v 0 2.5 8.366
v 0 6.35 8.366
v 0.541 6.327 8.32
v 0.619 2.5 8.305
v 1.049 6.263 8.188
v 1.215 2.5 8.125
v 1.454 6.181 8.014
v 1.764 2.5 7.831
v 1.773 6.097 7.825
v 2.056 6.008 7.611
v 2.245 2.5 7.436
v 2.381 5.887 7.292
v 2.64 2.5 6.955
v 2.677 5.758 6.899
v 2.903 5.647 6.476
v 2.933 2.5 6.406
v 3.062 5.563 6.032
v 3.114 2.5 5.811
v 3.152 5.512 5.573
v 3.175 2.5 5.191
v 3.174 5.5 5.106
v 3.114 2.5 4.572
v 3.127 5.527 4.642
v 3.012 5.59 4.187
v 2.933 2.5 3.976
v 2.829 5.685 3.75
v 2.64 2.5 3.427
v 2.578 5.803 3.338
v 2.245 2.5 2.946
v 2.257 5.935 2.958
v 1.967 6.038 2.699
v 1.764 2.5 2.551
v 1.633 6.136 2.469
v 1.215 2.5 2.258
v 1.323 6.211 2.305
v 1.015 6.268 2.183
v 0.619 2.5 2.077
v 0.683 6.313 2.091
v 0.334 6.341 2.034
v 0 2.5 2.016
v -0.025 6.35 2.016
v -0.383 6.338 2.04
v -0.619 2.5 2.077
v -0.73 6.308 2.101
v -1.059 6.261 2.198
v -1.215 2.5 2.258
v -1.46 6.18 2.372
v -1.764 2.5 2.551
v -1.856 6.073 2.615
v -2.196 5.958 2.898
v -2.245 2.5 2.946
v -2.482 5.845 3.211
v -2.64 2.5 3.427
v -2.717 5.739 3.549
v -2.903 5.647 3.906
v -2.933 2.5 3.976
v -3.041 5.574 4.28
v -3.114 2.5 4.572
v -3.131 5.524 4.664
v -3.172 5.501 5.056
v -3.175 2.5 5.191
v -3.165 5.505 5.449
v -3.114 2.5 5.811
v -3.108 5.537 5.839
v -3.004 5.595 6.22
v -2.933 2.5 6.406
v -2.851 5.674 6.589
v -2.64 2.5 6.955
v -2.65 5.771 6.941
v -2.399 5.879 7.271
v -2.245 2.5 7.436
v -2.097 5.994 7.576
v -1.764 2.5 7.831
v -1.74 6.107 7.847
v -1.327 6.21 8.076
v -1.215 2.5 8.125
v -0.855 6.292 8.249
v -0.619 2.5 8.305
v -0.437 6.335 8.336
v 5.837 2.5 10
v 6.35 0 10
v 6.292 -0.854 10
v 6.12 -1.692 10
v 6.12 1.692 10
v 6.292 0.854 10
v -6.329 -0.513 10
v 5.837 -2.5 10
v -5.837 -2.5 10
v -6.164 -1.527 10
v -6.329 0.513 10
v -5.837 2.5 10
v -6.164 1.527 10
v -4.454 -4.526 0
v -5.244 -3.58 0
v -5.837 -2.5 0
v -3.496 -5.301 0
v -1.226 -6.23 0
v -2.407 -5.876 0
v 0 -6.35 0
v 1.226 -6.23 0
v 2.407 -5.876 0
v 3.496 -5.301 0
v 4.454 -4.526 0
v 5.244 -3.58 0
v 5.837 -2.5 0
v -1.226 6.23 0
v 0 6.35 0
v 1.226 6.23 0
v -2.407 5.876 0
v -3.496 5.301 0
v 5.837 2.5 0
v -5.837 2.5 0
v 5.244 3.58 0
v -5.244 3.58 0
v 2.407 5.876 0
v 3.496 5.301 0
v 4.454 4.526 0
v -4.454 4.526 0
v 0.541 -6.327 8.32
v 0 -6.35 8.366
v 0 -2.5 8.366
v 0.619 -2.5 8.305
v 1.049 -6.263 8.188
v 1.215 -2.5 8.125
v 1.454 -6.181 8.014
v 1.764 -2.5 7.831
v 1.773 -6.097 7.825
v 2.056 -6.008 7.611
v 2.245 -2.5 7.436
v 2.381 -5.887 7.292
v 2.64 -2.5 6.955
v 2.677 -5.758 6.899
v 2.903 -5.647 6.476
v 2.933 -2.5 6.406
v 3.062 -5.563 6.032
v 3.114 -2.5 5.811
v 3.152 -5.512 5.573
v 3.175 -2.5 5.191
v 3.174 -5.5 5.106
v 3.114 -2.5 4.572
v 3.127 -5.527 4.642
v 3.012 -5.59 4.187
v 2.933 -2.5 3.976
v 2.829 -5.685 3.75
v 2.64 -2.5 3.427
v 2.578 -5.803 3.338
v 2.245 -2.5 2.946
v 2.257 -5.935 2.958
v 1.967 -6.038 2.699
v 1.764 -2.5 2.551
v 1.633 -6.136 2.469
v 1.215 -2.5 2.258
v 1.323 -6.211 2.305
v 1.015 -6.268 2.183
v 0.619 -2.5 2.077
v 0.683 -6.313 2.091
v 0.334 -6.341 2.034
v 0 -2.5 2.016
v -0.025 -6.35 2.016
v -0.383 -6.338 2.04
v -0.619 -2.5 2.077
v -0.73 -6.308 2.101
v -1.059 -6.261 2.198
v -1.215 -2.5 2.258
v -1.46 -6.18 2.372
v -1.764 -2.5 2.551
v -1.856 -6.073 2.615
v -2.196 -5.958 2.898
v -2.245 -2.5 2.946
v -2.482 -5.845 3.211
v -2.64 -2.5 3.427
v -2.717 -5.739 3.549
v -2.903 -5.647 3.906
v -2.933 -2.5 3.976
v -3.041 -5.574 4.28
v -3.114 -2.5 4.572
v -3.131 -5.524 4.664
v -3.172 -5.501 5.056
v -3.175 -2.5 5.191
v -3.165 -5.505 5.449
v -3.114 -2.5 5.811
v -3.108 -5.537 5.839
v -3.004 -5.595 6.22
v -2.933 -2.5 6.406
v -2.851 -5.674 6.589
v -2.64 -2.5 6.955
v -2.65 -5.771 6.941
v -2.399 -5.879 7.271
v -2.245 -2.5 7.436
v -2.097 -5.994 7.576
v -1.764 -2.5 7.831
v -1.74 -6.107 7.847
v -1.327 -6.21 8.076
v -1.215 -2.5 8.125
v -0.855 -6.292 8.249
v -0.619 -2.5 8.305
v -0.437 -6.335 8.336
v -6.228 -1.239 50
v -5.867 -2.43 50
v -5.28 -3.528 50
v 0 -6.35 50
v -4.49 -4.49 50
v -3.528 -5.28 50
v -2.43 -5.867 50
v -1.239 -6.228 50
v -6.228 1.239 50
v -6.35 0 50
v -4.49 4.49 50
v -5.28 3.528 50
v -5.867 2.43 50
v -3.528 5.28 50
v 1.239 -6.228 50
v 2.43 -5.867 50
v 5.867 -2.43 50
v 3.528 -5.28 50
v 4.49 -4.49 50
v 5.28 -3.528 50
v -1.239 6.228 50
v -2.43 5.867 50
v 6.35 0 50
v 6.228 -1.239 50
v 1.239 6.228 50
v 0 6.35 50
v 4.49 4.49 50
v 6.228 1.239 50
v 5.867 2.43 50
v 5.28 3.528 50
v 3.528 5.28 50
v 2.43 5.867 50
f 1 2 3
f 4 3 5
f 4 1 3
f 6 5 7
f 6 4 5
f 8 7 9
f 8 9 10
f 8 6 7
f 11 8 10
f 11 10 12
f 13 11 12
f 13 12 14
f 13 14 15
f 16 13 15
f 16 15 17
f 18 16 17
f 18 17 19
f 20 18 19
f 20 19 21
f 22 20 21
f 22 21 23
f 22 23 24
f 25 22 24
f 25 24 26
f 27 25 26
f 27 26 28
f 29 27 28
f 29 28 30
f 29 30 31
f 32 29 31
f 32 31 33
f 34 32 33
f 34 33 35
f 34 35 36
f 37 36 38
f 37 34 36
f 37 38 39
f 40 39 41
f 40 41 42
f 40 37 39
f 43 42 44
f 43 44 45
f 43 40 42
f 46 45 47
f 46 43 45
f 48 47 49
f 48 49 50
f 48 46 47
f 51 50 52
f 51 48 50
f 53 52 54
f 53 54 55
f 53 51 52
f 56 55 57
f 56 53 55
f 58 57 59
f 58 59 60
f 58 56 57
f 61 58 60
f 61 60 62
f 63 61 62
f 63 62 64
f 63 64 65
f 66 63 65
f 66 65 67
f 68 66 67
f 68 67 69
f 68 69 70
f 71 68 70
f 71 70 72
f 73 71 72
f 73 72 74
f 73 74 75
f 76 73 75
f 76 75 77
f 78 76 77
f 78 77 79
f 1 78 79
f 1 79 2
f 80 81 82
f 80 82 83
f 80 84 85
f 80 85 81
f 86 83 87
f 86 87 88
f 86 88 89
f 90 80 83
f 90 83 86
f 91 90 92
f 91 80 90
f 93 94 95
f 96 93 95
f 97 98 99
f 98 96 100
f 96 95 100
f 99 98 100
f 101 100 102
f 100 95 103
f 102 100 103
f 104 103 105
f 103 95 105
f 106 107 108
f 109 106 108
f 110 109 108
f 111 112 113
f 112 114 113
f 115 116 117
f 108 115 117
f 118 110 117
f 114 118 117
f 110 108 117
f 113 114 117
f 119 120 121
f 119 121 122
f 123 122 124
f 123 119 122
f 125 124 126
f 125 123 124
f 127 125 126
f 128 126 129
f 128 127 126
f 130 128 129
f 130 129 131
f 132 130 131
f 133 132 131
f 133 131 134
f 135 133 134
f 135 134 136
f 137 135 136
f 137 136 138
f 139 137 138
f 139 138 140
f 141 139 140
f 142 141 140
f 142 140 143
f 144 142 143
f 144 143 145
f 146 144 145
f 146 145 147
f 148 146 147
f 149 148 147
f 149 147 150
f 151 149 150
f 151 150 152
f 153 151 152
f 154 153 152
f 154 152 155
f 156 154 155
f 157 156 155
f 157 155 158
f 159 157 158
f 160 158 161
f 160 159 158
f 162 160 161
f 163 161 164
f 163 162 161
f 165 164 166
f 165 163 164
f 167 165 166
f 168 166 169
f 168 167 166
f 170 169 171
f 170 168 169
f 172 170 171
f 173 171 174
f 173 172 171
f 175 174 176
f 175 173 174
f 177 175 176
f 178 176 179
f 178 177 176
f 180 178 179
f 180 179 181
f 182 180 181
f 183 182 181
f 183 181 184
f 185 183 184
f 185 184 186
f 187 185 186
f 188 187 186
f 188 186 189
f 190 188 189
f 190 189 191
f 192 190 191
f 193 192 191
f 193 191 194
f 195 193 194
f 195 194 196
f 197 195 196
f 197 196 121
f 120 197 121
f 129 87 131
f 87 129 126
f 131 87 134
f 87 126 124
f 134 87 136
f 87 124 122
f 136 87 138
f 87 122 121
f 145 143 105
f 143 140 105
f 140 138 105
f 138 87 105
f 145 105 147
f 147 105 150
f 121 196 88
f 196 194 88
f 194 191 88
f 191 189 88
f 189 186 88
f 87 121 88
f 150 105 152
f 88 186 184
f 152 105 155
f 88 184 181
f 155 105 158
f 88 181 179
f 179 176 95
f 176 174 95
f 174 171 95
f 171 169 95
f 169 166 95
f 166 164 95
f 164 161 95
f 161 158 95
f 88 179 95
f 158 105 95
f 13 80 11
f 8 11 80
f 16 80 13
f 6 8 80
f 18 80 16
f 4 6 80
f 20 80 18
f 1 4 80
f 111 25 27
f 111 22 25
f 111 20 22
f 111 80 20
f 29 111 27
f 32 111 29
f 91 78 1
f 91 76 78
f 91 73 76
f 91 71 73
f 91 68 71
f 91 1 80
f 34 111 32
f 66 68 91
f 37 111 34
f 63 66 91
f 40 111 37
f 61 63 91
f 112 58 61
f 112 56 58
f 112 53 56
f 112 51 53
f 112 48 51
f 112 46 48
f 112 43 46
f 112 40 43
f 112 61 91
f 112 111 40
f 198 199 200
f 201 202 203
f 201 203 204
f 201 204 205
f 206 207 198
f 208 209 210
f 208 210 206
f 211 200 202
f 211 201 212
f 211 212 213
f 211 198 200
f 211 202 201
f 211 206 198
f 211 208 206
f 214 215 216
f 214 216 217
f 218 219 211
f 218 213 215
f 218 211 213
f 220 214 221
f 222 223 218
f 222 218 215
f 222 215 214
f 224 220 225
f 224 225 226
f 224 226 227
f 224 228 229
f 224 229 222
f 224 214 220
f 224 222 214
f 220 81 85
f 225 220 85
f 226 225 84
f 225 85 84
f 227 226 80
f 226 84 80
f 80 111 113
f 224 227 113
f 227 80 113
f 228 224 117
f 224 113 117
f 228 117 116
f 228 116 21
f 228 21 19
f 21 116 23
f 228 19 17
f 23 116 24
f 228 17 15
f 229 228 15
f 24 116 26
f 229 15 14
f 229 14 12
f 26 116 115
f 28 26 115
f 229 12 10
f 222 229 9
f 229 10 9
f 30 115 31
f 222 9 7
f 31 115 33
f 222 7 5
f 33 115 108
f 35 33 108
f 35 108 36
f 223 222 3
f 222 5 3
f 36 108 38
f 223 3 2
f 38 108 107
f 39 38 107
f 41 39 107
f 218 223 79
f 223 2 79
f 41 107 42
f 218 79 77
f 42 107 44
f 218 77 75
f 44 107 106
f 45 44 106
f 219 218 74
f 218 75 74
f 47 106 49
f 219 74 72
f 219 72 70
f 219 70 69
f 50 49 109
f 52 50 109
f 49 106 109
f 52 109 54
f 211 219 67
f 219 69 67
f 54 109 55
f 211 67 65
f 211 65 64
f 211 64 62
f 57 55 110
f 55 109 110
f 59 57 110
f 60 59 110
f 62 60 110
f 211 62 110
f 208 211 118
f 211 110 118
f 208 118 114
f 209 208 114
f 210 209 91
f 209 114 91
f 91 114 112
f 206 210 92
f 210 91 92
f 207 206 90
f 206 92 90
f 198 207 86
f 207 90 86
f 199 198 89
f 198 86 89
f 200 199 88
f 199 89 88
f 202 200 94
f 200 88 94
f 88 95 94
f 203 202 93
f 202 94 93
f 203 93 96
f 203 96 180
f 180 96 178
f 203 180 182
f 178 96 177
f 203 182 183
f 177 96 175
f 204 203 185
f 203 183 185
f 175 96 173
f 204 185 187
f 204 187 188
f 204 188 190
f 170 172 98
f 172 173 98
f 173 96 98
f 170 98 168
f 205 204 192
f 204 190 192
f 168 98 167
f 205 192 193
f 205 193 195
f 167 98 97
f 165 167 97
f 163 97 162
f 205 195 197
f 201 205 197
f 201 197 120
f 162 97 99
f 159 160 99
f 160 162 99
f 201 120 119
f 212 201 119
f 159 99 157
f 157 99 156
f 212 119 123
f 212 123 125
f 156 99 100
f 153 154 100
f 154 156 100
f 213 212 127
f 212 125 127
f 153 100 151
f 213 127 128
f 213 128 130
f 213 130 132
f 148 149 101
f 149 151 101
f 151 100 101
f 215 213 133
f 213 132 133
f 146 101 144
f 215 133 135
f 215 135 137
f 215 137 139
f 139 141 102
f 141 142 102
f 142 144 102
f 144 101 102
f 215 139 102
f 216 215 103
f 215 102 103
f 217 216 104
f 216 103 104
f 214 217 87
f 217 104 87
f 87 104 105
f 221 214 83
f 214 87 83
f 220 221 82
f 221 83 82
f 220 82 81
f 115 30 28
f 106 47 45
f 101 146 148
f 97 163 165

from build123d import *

# Parameters (mm, degrees)
CROQUIS1_R                 = 6.35
SALIENTE_EXTRUIR1_DEPTH    = 50
CROQUIS2_W                 = 21.76436001
CROQUIS2_H                 = 5
CORTAR_EXTRUIR1_DEPTH      = 10
CORTAR_EXTRUIR2_DEPTH      = 51.800049213
CORTAR_EXTRUIR2_DEPTH_BACK = 15.526172758
CROQUIS3_R                 = 3.175


with BuildPart() as part:
    # Croquis1 → Saliente-Extruir1 (new body)
    with BuildSketch(Plane.XY):
        Circle(CROQUIS1_R)
    extrude(amount=SALIENTE_EXTRUIR1_DEPTH)

    # Croquis2 → Cortar-Extruir1 (cut)
    with BuildSketch(Plane(origin=(0, 0, 0), x_dir=(-1, 0, 0), z_dir=(0, 0, -1))):
        Rectangle(CROQUIS2_W, CROQUIS2_H)
    extrude(amount=-CORTAR_EXTRUIR1_DEPTH, mode=Mode.SUBTRACT)

    # Croquis3 → Cortar-Extruir2 (cut, two sides: drawn at the far end of the back side and taken through both)
    with BuildSketch(Plane(origin=(0, 0, 0), x_dir=(1, 0, 0), z_dir=(0, 1, 0)).offset(-CORTAR_EXTRUIR2_DEPTH_BACK)):
        with Locations(Location((0, -5.191356095, 0), (0, 0, 270))):
            Circle(CROQUIS3_R)
    extrude(amount=CORTAR_EXTRUIR2_DEPTH + CORTAR_EXTRUIR2_DEPTH_BACK, mode=Mode.SUBTRACT)


solid = part.part
